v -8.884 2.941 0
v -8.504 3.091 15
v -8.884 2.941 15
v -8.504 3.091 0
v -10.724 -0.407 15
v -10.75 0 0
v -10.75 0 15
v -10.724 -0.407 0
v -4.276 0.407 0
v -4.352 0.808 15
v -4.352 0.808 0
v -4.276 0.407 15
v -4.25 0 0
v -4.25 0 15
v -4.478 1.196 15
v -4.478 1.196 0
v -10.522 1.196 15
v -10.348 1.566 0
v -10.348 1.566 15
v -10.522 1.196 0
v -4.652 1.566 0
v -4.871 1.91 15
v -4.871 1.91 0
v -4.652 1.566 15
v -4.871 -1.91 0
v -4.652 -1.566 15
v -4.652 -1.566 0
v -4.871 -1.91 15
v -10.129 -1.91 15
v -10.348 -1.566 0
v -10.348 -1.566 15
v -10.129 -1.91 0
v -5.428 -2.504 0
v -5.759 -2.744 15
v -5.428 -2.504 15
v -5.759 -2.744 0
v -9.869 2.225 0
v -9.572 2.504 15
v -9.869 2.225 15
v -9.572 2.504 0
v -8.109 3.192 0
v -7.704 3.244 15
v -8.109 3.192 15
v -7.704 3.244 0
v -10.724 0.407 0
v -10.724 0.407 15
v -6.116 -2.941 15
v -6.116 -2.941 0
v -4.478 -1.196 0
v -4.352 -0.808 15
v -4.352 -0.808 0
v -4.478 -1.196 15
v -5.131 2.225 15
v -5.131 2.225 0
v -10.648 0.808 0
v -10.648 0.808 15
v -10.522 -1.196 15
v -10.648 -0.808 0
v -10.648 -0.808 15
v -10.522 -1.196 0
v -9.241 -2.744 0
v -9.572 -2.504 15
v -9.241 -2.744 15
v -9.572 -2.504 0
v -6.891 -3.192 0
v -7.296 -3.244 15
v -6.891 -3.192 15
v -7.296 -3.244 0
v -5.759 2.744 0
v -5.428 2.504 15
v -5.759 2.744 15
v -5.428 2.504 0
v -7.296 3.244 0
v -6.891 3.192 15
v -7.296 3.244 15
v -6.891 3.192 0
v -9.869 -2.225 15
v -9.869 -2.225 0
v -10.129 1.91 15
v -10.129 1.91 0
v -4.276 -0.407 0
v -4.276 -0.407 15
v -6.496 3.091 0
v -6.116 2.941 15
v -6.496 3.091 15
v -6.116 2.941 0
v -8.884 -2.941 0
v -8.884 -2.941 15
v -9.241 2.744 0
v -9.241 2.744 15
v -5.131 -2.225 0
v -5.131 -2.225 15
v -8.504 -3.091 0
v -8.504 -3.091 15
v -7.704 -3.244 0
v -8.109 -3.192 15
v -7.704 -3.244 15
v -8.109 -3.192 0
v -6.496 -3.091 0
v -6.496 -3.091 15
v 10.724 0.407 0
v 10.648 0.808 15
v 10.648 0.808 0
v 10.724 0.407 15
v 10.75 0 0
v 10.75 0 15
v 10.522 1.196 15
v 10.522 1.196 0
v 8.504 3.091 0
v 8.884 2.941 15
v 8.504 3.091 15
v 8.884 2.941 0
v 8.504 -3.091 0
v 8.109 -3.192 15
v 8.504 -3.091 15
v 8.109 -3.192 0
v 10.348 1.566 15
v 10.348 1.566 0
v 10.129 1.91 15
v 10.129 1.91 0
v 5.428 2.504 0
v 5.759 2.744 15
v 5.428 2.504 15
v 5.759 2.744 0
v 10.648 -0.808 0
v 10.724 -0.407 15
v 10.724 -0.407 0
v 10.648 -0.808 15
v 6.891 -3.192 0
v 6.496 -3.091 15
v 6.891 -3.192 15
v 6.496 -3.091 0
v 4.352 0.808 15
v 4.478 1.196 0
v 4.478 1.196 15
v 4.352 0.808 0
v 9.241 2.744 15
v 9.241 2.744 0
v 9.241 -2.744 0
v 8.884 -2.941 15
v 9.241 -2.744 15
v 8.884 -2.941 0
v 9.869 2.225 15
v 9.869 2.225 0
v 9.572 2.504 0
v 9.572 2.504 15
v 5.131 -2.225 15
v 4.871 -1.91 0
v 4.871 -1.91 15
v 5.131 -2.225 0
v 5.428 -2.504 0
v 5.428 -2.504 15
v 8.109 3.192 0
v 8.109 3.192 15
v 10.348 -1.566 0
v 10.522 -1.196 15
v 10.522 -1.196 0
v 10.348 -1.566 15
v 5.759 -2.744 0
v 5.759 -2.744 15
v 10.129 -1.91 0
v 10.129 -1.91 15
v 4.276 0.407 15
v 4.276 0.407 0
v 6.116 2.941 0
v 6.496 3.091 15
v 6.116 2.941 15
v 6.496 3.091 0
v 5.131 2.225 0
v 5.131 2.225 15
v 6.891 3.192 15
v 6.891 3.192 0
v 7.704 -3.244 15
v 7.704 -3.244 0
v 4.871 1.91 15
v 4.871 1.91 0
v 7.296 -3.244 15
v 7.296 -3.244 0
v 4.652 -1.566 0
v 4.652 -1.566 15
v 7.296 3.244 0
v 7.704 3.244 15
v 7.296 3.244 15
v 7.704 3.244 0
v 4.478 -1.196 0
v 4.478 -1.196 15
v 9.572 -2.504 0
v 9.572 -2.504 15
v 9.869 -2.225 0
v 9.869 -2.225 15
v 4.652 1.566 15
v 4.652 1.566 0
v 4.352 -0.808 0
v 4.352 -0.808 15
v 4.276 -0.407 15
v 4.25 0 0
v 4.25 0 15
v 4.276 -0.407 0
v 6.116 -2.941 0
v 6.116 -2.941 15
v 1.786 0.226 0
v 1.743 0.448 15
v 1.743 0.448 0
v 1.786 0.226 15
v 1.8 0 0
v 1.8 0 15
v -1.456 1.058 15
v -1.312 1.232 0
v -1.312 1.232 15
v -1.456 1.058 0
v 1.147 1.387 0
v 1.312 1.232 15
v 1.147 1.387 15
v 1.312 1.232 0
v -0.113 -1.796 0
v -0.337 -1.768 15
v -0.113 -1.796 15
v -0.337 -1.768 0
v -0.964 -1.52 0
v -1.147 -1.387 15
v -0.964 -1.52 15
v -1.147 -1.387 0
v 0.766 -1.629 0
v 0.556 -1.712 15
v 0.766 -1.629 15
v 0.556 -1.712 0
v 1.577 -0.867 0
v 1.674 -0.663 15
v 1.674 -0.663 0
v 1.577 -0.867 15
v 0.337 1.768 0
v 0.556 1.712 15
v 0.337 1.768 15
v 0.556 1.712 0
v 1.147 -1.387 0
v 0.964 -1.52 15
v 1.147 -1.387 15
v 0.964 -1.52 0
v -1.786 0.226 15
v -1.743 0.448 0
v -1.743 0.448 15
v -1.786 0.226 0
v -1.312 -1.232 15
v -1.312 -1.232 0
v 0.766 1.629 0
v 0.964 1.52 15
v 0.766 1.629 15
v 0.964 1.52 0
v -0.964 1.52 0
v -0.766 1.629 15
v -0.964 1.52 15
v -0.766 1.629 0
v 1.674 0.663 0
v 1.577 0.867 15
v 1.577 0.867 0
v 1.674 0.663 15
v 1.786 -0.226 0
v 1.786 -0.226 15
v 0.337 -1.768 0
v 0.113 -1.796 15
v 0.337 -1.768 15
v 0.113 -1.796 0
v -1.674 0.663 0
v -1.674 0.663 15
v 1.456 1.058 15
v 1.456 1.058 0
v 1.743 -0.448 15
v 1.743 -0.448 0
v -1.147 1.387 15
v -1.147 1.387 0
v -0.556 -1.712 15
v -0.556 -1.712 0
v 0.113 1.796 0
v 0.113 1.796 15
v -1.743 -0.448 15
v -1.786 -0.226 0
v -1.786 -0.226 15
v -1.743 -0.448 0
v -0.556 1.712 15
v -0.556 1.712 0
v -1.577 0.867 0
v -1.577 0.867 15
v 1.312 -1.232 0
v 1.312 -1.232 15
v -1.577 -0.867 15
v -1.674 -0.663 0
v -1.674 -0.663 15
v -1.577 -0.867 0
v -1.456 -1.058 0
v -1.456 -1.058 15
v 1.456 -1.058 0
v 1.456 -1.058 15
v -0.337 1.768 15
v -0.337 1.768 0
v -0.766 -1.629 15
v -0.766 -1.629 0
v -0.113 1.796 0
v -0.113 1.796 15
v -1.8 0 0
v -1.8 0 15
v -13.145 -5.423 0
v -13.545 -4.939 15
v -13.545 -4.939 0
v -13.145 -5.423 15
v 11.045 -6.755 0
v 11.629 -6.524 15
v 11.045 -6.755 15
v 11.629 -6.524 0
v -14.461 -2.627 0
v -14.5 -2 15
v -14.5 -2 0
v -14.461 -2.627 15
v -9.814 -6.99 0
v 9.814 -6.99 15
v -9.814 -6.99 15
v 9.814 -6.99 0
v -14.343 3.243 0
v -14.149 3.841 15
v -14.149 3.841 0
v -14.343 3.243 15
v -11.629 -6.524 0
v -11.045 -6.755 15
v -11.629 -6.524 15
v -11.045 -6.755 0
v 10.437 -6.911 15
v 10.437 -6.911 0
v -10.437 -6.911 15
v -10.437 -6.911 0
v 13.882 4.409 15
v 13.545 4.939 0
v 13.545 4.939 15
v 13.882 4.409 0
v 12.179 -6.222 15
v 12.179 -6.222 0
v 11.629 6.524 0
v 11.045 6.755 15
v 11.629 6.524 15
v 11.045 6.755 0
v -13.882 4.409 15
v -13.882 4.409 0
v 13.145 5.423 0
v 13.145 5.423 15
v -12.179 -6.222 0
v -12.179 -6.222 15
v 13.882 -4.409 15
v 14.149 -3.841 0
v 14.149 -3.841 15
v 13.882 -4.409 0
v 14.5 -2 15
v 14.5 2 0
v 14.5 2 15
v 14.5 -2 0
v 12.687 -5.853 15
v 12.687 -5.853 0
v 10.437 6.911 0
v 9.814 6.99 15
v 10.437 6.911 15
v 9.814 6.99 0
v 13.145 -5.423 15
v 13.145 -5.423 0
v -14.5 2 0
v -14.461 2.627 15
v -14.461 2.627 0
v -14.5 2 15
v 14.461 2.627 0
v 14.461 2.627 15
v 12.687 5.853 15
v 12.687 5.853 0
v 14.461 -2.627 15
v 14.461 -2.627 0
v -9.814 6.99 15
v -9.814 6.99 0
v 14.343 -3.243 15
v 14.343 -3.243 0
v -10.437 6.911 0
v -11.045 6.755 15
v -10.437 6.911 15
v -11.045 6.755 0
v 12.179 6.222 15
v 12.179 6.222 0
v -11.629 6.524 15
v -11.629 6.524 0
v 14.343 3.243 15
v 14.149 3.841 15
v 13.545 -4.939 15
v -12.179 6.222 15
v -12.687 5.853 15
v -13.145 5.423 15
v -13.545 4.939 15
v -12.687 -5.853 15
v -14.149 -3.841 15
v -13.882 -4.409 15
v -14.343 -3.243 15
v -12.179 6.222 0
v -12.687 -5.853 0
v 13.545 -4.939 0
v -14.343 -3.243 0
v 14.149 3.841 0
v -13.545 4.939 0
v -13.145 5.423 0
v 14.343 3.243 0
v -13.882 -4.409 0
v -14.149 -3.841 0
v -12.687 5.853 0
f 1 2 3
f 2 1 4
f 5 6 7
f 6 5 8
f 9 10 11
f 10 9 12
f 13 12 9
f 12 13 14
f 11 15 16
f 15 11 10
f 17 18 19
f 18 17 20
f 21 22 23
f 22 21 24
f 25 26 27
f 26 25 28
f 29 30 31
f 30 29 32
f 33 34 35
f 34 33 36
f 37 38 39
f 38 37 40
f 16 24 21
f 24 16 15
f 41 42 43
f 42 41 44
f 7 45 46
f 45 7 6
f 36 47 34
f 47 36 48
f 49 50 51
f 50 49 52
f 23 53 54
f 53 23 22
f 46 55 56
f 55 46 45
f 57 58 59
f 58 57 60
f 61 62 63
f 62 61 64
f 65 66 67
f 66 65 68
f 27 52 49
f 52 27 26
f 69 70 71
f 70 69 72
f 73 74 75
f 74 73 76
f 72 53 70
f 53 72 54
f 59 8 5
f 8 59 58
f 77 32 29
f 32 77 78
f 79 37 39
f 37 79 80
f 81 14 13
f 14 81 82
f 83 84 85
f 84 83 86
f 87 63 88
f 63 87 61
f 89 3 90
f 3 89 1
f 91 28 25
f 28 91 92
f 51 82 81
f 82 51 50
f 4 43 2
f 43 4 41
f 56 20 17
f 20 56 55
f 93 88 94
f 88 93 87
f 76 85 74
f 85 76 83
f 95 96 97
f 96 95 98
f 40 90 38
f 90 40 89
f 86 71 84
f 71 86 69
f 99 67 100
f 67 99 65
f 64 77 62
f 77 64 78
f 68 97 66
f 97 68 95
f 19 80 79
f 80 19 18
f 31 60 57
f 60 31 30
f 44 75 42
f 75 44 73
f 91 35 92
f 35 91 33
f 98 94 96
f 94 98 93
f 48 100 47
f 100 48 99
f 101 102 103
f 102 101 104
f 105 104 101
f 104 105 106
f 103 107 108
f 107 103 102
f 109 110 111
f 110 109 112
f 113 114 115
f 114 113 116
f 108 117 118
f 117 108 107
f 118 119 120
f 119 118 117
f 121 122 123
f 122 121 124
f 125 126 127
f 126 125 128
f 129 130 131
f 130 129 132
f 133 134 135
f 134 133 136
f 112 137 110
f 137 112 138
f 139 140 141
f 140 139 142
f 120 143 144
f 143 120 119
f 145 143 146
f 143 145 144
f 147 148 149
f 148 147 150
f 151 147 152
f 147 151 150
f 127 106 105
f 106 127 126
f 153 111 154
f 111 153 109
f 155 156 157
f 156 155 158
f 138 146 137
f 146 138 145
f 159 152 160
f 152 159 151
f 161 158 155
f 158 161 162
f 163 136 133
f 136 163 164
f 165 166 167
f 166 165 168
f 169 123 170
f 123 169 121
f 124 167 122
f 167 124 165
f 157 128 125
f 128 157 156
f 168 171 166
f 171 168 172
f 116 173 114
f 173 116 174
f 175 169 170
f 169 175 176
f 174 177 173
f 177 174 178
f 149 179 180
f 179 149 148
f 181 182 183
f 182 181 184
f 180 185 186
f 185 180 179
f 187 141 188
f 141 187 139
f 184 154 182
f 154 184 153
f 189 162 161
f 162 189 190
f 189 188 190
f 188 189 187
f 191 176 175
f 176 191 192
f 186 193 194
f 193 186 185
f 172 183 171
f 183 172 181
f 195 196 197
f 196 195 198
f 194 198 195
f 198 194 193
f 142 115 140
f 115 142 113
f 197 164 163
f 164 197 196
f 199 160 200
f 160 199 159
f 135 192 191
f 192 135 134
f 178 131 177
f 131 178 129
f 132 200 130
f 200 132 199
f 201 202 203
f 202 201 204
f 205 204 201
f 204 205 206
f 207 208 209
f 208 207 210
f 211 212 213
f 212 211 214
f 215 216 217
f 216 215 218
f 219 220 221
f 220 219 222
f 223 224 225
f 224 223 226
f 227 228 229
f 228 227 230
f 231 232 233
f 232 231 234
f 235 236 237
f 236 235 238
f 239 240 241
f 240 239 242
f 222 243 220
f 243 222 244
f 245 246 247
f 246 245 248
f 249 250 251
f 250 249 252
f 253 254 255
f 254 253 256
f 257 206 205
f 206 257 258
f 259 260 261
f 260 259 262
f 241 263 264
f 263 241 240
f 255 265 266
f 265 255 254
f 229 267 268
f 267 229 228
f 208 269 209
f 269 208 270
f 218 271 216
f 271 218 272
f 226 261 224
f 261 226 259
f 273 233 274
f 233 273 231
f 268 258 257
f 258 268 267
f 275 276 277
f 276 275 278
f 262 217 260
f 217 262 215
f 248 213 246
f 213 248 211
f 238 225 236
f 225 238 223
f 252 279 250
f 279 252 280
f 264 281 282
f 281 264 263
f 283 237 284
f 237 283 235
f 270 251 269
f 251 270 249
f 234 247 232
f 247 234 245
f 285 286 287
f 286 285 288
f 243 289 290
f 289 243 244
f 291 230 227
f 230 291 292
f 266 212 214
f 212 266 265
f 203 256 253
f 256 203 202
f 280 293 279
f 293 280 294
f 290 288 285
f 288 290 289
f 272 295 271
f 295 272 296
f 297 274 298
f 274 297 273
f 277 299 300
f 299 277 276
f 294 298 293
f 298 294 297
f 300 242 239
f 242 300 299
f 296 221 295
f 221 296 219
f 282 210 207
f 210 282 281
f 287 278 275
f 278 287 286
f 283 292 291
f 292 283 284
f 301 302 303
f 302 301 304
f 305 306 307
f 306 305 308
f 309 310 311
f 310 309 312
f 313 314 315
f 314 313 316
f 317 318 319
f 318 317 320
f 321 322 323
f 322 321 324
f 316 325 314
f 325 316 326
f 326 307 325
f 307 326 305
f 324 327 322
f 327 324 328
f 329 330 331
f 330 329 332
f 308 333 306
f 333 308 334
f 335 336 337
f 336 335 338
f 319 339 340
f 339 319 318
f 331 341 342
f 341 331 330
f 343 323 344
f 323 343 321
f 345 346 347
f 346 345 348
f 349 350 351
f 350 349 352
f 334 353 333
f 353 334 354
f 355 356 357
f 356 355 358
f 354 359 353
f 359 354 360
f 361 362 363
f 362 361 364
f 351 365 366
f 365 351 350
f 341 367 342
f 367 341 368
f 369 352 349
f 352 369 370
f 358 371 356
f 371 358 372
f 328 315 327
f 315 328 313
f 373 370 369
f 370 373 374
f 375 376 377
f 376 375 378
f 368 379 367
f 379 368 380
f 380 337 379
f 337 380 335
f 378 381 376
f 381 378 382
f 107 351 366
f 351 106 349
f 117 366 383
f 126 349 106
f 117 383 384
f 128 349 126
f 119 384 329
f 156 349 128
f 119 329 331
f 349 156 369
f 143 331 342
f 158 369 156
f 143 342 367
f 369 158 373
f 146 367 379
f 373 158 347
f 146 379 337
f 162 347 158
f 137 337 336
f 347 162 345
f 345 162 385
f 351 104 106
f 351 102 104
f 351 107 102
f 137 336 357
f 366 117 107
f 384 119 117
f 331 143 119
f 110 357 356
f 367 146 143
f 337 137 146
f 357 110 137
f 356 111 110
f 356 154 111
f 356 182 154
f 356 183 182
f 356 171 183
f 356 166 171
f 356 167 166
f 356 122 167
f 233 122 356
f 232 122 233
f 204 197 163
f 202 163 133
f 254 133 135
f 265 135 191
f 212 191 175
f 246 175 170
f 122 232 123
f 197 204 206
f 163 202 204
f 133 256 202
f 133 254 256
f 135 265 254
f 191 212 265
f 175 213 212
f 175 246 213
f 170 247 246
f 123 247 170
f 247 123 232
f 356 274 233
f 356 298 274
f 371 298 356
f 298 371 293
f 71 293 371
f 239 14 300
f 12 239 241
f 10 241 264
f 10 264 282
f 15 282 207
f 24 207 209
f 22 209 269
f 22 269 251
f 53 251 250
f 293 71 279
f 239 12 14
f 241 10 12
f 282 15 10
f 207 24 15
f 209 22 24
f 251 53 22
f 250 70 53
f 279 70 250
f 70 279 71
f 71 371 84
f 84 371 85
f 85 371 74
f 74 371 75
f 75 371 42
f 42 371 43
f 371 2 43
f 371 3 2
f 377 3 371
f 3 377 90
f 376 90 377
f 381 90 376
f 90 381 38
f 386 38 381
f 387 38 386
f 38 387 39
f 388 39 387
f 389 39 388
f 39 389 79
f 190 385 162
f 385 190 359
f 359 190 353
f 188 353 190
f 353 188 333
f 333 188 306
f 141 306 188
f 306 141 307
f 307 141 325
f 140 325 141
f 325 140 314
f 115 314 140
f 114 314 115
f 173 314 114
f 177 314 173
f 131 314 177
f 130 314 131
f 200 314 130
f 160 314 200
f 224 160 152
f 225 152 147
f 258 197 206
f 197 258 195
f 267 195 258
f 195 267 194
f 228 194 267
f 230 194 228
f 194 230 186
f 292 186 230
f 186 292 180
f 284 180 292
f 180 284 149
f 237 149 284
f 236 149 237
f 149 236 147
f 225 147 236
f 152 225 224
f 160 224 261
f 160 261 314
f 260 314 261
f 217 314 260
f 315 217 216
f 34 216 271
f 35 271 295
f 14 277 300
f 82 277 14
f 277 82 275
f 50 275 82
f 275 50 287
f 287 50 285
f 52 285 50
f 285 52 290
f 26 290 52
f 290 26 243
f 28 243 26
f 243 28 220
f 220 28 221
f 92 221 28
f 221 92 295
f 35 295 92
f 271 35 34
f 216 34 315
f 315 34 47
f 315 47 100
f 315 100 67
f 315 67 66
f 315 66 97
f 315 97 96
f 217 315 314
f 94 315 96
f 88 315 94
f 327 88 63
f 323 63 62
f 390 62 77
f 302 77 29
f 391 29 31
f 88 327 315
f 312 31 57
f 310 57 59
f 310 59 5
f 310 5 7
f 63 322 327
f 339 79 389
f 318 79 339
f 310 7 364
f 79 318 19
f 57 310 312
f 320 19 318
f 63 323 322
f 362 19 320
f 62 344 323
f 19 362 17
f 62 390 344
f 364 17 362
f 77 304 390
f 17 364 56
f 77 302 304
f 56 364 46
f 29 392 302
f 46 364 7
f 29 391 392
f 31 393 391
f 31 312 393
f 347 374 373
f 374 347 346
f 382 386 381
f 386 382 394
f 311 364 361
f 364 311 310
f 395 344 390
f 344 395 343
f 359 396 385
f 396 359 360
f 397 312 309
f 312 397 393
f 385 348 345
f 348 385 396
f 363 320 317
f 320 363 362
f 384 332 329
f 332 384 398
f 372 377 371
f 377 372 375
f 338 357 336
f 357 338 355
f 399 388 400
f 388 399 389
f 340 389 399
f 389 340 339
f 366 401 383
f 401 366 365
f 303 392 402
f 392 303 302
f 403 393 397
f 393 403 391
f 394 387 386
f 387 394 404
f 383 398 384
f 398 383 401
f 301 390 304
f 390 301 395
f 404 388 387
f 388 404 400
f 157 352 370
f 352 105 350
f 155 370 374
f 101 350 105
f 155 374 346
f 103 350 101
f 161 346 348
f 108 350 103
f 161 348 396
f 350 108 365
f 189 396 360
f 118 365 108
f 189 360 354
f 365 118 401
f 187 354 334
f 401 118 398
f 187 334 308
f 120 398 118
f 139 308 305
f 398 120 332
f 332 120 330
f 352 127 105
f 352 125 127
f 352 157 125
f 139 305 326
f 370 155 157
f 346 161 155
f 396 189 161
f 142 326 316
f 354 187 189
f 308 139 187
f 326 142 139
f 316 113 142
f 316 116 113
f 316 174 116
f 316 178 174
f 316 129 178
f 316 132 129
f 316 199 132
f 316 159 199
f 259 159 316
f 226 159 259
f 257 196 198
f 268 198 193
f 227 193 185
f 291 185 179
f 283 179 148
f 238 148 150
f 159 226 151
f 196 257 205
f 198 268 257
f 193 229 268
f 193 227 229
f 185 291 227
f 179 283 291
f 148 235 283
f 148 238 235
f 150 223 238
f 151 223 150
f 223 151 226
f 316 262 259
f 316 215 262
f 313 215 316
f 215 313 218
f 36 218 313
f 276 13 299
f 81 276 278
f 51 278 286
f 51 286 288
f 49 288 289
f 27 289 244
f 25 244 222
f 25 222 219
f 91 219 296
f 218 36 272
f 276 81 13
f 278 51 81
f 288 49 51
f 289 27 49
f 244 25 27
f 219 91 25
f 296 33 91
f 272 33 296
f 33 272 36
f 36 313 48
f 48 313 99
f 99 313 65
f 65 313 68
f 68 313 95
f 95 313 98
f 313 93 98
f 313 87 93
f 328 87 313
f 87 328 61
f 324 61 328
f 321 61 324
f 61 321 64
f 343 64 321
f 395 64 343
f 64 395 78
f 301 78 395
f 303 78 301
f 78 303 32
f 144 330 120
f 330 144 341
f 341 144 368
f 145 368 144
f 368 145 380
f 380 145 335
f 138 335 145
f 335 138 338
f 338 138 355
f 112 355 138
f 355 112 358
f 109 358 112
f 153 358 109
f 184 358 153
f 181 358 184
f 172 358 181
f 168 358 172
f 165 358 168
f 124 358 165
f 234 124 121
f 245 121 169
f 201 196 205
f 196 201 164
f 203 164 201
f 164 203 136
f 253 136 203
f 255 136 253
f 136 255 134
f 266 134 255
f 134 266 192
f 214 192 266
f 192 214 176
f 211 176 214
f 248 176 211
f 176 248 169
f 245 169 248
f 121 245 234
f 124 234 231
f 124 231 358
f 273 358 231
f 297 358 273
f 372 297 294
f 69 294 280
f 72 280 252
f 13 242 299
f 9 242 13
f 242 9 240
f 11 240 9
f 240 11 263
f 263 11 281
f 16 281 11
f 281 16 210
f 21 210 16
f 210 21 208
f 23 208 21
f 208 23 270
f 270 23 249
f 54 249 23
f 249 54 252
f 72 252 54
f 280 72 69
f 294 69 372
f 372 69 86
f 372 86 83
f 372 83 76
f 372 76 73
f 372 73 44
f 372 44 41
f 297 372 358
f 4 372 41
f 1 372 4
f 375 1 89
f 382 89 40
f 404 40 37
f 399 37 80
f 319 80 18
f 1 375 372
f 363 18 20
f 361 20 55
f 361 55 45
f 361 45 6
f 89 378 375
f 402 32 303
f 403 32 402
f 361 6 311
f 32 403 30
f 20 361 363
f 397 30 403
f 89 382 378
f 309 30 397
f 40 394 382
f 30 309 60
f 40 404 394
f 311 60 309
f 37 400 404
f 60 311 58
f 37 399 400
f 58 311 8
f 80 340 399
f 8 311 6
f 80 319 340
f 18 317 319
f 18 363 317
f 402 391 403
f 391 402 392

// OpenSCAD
$fn = 50;


difference() {
	union() {
		hull() {
			translate(v = [-9.5000000000, 2.0000000000, 0]) {
				cylinder(h = 15, r = 5);
			}
			translate(v = [9.5000000000, 2.0000000000, 0]) {
				cylinder(h = 15, r = 5);
			}
			translate(v = [-9.5000000000, -2.0000000000, 0]) {
				cylinder(h = 15, r = 5);
			}
			translate(v = [9.5000000000, -2.0000000000, 0]) {
				cylinder(h = 15, r = 5);
			}
		}
	}
	union() {
		translate(v = [-7.5000000000, 0.0000000000, 0]) {
			translate(v = [0, 0, -100]) {
				cylinder(h = 200, r = 3.2500000000);
			}
		}
		translate(v = [7.5000000000, 0.0000000000, 0]) {
			translate(v = [0, 0, -100]) {
				cylinder(h = 200, r = 3.2500000000);
			}
		}
		translate(v = [-7.5000000000, 0.0000000000, 0]) {
			translate(v = [0, 0, -100]) {
				cylinder(h = 200, r = 1.8000000000);
			}
		}
		translate(v = [0, 0, -100]) {
			cylinder(h = 200, r = 1.8000000000);
		}
		translate(v = [7.5000000000, 0.0000000000, 0]) {
			translate(v = [0, 0, -100]) {
				cylinder(h = 200, r = 1.8000000000);
			}
		}
	}
}
